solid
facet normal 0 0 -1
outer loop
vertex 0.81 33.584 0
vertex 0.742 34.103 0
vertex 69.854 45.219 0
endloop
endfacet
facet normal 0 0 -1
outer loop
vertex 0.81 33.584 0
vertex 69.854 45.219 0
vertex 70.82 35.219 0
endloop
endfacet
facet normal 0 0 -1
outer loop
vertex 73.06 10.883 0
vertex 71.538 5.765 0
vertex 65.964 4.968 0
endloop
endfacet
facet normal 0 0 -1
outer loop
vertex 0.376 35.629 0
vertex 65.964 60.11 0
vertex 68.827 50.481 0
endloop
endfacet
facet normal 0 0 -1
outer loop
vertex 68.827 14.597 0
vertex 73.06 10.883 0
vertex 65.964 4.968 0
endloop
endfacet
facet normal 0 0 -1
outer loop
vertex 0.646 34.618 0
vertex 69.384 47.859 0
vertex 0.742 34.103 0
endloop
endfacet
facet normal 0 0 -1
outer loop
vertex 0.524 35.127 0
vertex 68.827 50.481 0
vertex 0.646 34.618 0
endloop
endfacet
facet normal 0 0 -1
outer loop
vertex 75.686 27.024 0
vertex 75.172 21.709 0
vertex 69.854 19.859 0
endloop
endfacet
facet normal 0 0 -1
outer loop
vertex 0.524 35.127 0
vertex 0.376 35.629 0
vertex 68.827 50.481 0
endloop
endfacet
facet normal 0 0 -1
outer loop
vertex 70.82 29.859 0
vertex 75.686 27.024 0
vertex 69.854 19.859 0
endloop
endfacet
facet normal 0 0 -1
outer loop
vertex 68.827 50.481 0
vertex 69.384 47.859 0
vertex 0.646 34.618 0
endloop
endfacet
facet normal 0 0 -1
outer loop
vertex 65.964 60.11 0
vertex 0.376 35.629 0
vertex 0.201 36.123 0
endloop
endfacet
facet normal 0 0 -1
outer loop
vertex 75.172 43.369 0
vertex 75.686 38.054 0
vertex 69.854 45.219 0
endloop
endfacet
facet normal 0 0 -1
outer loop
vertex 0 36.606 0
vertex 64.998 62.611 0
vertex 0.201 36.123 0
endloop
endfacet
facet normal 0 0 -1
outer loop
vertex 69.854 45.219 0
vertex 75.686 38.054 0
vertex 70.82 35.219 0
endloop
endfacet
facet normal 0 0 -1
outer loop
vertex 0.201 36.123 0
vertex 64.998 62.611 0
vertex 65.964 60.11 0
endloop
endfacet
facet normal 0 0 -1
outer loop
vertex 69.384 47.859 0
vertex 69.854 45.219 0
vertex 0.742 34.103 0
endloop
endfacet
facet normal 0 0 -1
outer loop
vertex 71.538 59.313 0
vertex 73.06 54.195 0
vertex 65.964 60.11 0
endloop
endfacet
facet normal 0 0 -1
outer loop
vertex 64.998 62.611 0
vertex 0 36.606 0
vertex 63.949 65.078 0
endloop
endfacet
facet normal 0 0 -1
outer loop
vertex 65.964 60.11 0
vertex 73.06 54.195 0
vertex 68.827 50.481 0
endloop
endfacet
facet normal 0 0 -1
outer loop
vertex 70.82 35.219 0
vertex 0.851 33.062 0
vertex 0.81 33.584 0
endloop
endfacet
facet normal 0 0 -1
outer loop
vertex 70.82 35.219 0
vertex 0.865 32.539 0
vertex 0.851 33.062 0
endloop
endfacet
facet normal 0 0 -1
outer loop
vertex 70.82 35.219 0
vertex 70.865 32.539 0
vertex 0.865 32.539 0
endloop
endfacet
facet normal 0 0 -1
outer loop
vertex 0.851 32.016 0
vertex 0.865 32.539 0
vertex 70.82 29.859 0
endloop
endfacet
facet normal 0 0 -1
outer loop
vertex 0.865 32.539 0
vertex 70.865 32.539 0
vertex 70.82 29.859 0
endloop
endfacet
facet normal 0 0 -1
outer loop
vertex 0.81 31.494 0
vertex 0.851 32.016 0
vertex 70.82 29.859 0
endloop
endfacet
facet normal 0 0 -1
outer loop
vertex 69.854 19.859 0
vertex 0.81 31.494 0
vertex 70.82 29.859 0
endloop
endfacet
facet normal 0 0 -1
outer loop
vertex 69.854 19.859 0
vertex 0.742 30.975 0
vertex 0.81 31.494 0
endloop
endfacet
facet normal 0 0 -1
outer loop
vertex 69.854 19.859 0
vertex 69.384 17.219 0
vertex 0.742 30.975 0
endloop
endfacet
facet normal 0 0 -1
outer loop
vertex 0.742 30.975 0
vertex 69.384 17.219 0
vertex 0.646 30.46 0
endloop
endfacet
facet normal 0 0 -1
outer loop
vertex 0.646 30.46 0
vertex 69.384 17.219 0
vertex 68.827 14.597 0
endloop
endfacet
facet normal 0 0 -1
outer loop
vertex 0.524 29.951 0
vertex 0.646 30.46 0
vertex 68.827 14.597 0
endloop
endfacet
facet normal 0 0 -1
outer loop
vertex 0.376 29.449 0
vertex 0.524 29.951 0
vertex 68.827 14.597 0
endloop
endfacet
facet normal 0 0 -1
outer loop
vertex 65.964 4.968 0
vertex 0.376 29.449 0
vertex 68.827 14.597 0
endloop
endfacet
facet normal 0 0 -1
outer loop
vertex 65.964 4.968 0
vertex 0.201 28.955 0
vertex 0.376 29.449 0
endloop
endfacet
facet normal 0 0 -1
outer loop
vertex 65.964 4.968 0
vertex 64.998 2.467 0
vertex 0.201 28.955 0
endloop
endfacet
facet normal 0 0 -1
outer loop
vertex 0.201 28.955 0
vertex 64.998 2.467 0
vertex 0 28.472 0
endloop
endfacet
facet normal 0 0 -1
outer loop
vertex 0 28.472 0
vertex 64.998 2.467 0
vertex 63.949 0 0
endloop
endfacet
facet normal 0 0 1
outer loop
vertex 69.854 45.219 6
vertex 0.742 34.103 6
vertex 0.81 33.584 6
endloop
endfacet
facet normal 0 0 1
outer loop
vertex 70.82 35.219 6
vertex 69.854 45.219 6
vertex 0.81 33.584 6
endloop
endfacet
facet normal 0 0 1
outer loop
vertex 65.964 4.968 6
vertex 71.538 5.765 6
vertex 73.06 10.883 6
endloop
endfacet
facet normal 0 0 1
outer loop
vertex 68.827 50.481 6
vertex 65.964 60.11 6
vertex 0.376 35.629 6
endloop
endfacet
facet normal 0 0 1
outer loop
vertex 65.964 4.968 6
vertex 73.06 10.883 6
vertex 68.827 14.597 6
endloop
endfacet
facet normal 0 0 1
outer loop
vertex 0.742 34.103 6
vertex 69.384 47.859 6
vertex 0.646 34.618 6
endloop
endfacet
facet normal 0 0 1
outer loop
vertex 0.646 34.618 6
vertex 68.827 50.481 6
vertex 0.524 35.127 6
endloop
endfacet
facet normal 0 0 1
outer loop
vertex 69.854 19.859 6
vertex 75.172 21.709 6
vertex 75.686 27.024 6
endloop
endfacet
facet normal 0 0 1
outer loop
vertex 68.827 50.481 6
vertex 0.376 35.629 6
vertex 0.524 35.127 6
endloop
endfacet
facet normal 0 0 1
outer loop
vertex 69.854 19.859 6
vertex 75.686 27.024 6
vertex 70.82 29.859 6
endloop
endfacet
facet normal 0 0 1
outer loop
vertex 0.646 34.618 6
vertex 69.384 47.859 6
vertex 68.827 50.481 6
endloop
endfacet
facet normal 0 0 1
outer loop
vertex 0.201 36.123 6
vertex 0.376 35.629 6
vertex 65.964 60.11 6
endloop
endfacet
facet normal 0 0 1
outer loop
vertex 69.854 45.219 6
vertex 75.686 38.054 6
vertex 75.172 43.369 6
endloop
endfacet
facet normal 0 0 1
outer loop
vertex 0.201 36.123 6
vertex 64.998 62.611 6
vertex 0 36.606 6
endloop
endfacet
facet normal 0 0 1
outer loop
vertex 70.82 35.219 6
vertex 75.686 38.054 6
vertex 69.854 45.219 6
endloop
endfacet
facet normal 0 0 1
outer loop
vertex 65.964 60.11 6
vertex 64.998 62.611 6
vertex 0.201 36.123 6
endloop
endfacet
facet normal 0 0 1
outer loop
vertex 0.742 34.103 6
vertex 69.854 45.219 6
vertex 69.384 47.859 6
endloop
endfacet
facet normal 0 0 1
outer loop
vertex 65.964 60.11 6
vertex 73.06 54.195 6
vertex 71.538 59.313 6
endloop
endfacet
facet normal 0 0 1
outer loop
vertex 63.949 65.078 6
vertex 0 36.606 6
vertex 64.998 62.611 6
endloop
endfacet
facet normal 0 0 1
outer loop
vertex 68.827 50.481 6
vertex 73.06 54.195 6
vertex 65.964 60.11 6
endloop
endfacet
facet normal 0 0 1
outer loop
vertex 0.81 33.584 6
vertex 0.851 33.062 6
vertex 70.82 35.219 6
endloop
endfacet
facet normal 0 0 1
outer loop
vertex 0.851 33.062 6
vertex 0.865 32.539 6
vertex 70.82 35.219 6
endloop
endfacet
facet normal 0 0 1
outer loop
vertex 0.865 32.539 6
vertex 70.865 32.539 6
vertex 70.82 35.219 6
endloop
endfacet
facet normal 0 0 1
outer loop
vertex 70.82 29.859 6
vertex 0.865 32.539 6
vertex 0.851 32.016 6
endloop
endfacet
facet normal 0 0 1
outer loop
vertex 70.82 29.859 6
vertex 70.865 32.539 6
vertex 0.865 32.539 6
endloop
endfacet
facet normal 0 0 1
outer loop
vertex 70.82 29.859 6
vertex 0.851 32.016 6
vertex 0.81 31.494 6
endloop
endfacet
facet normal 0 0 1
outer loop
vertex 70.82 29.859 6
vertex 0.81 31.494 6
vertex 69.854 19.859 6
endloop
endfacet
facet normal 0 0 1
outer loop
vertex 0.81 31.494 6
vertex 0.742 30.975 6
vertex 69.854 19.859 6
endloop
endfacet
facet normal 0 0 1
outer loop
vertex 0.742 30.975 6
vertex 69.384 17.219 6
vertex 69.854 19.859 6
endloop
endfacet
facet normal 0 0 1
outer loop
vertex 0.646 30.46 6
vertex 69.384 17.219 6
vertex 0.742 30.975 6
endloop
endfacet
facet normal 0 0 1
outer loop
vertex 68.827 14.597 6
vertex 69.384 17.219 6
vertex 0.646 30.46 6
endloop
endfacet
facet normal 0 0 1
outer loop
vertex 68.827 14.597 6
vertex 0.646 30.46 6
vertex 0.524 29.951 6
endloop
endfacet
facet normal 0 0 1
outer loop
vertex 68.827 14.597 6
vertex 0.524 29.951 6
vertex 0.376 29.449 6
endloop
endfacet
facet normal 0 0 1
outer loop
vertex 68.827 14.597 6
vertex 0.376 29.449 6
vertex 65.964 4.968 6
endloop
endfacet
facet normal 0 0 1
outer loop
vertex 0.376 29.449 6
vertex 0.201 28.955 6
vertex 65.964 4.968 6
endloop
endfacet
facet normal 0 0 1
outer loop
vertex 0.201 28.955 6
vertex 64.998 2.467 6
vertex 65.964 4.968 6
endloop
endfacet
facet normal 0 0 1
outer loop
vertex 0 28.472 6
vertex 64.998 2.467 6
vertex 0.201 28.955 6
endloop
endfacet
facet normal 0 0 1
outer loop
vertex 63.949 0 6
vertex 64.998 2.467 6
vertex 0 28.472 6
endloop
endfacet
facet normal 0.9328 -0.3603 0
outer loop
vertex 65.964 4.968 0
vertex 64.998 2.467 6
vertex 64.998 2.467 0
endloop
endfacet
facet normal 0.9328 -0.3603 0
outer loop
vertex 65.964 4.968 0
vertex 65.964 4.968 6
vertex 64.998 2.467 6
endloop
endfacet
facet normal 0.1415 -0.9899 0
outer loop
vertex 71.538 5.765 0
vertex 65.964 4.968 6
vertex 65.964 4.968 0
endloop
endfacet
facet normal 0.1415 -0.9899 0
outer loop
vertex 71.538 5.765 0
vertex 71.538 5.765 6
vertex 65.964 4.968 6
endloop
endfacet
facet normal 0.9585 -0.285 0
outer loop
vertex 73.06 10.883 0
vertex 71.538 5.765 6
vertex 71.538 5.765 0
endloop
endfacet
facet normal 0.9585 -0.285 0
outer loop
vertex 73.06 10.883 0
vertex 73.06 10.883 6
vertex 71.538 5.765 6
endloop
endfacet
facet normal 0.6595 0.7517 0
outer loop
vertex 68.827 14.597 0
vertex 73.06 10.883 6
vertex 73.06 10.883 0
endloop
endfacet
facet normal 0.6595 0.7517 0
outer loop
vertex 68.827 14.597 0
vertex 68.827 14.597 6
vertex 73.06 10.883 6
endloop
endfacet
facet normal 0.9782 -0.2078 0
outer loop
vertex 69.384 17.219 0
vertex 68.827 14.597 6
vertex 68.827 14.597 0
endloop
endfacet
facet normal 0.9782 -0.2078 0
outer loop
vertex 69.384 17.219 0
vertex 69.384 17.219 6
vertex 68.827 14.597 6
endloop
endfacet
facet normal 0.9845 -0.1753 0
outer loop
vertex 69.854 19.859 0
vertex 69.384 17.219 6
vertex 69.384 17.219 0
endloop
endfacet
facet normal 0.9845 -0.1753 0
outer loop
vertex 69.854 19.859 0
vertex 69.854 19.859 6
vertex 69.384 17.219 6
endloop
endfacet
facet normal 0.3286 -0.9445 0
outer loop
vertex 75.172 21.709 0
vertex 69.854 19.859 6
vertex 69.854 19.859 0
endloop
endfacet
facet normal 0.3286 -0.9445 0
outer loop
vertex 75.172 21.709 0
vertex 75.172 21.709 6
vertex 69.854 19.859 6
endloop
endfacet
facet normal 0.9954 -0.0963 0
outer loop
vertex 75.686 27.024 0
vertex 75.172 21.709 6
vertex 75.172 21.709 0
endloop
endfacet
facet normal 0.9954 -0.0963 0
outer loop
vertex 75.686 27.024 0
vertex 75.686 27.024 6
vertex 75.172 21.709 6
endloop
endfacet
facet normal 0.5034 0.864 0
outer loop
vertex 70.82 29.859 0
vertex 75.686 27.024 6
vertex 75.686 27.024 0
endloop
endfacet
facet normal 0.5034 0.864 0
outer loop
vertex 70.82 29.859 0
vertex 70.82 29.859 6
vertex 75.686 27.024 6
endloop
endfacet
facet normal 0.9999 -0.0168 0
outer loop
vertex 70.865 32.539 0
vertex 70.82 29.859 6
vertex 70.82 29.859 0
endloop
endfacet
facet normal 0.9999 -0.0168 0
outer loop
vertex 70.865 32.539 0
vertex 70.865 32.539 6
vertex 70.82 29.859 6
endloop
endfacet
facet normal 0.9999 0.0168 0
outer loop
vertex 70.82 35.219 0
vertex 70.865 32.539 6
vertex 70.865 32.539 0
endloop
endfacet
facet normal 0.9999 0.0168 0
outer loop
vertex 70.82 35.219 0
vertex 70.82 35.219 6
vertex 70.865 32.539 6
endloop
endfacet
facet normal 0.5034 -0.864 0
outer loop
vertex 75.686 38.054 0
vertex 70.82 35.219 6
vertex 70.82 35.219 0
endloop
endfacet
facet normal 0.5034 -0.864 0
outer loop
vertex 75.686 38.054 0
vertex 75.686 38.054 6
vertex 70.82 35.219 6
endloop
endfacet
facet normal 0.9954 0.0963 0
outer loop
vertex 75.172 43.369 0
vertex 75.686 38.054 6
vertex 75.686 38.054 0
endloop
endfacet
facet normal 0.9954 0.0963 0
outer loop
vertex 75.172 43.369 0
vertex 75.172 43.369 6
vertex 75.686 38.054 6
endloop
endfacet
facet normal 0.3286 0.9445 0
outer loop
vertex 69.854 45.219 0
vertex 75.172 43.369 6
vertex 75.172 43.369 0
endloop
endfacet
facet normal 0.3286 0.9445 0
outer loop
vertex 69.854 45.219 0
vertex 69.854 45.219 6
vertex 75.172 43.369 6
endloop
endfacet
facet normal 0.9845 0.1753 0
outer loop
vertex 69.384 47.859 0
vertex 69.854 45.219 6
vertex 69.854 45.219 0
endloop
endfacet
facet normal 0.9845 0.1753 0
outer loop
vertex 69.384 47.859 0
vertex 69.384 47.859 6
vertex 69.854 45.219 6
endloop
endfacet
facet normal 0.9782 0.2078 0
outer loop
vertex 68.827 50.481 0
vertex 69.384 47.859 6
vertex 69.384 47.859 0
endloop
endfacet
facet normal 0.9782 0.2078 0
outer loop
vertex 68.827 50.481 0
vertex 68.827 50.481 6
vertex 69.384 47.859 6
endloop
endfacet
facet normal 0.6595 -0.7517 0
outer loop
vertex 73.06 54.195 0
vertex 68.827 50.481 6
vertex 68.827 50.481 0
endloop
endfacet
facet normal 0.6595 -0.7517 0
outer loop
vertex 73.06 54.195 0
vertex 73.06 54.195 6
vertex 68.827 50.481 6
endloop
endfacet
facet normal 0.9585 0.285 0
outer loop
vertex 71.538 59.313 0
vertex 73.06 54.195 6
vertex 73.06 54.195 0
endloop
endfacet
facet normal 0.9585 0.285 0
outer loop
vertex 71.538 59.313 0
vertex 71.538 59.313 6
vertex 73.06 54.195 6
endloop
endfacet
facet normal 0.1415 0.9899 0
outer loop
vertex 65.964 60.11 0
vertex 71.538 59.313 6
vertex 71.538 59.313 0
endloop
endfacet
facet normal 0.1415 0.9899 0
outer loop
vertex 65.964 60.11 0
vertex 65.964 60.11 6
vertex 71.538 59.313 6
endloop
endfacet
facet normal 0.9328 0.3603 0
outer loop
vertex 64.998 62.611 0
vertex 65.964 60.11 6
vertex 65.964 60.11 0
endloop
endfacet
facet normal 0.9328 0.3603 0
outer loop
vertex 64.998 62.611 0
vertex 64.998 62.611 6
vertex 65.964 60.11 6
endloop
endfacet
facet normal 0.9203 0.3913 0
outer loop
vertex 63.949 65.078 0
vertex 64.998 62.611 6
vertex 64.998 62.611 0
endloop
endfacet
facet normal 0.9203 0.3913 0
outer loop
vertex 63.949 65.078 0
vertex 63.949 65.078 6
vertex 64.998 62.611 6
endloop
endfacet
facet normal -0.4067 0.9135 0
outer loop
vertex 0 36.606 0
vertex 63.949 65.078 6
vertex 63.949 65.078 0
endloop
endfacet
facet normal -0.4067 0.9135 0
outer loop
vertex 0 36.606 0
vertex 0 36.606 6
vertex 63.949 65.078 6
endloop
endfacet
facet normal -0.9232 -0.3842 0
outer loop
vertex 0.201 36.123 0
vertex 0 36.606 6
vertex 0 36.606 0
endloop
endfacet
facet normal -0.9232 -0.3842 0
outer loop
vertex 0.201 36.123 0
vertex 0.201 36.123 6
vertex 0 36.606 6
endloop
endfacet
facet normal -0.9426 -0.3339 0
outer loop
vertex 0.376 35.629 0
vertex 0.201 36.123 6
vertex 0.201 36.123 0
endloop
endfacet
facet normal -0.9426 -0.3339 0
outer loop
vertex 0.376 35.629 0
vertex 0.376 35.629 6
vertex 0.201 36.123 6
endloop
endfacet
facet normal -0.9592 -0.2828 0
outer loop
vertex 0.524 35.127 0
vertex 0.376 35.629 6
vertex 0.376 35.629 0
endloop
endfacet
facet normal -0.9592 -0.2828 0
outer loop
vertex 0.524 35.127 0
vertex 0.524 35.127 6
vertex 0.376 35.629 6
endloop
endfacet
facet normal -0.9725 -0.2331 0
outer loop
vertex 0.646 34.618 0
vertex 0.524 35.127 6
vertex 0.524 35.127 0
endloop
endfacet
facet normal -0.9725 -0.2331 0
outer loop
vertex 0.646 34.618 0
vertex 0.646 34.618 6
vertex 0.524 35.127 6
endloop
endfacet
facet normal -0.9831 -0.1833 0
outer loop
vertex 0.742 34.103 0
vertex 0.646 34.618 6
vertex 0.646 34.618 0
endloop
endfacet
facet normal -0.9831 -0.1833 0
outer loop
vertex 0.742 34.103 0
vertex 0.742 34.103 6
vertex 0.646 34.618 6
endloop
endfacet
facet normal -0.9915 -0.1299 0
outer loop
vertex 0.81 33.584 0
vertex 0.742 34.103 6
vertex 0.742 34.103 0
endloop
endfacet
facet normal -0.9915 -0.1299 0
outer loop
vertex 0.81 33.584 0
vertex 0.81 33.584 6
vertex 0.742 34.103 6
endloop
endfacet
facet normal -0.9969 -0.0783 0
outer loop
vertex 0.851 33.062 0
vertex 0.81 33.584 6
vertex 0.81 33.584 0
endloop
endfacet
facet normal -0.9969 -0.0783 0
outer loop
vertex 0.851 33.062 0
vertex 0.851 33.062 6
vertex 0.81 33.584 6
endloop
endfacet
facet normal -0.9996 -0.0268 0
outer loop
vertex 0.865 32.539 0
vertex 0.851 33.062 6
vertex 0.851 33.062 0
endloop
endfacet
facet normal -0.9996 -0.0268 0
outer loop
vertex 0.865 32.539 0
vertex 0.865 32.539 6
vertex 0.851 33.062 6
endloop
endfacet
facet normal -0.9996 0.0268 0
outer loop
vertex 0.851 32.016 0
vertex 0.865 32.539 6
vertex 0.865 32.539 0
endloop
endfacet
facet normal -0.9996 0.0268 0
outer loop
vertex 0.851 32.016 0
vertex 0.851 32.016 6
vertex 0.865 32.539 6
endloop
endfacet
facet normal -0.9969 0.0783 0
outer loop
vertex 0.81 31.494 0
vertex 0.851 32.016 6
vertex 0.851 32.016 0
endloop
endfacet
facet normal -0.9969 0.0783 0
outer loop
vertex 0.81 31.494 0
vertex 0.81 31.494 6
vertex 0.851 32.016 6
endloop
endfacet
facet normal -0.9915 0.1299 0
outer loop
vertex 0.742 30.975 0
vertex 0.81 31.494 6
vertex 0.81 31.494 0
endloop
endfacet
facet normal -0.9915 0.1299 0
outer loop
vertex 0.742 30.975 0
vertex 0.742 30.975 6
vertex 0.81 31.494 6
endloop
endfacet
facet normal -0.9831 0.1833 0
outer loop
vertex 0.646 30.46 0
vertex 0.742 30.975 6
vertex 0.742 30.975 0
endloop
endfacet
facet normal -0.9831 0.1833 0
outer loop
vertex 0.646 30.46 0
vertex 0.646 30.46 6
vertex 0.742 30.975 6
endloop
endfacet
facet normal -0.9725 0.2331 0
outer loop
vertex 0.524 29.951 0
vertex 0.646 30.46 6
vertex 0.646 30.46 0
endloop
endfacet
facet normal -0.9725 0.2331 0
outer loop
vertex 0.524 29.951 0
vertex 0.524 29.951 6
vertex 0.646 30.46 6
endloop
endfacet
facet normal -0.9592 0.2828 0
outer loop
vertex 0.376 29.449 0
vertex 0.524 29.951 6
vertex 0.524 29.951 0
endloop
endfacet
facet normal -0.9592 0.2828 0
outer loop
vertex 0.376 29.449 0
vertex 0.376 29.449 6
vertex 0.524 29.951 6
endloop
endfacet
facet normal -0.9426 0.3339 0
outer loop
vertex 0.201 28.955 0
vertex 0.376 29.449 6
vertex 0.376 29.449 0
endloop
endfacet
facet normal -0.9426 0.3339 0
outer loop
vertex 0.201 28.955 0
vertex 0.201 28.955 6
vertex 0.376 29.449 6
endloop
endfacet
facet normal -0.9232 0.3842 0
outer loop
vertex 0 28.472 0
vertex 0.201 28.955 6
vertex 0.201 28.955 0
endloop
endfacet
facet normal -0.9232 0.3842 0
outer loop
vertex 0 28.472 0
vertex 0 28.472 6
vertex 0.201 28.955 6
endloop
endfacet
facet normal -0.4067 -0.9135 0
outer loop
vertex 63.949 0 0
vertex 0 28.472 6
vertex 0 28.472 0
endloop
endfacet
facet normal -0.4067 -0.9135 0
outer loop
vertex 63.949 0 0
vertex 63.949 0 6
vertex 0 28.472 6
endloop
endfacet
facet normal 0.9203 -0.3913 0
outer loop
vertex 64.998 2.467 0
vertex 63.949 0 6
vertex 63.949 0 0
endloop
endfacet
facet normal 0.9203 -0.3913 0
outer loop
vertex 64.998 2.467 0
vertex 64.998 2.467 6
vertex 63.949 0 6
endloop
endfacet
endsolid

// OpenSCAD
$fn = 32;

// ----------------------------------------------------------------------
// Gear sector: 4 teeth on 48 degrees
// ----------------------------------------------------------------------

// --- parameters (mm) ---
sector_angle = 48;        // sector angle, degrees
root_r = 80;              // root circle radius
tooth_h = 5;              // tooth height over the root circle
teeth = 4;                // number of teeth on the sector
hub_r = 10;               // hub bore radius
plate_t = 6;              // sector thickness, Z
arc_step = 3;             // sampling step of the root/hub arcs, degrees

tip_r = root_r + tooth_h;  // tip circle radius

profile = [[63.949, 0], [64.998, 2.467], [65.964, 4.968], [71.538, 5.765], [73.06, 10.883], [68.827, 14.597], [69.384, 17.219], [69.854, 19.859], [75.172, 21.709], [75.686, 27.024], [70.82, 29.859], [70.865, 32.539], [70.82, 35.219], [75.686, 38.054], [75.172, 43.369], [69.854, 45.219], [69.384, 47.859], [68.827, 50.481], [73.06, 54.195], [71.538, 59.313], [65.964, 60.11], [64.998, 62.611], [63.949, 65.078], [0, 36.606], [0.201, 36.123], [0.376, 35.629], [0.524, 35.127], [0.646, 34.618], [0.742, 34.103], [0.81, 33.584], [0.851, 33.062], [0.865, 32.539], [0.851, 32.016], [0.81, 31.494], [0.742, 30.975], [0.646, 30.46], [0.524, 29.951], [0.376, 29.449], [0.201, 28.955], [0, 28.472]];  // primary outline, 40 points, counter clockwise

// --- the one profile operation ---
linear_extrude(height = plate_t) polygon(points = profile);
